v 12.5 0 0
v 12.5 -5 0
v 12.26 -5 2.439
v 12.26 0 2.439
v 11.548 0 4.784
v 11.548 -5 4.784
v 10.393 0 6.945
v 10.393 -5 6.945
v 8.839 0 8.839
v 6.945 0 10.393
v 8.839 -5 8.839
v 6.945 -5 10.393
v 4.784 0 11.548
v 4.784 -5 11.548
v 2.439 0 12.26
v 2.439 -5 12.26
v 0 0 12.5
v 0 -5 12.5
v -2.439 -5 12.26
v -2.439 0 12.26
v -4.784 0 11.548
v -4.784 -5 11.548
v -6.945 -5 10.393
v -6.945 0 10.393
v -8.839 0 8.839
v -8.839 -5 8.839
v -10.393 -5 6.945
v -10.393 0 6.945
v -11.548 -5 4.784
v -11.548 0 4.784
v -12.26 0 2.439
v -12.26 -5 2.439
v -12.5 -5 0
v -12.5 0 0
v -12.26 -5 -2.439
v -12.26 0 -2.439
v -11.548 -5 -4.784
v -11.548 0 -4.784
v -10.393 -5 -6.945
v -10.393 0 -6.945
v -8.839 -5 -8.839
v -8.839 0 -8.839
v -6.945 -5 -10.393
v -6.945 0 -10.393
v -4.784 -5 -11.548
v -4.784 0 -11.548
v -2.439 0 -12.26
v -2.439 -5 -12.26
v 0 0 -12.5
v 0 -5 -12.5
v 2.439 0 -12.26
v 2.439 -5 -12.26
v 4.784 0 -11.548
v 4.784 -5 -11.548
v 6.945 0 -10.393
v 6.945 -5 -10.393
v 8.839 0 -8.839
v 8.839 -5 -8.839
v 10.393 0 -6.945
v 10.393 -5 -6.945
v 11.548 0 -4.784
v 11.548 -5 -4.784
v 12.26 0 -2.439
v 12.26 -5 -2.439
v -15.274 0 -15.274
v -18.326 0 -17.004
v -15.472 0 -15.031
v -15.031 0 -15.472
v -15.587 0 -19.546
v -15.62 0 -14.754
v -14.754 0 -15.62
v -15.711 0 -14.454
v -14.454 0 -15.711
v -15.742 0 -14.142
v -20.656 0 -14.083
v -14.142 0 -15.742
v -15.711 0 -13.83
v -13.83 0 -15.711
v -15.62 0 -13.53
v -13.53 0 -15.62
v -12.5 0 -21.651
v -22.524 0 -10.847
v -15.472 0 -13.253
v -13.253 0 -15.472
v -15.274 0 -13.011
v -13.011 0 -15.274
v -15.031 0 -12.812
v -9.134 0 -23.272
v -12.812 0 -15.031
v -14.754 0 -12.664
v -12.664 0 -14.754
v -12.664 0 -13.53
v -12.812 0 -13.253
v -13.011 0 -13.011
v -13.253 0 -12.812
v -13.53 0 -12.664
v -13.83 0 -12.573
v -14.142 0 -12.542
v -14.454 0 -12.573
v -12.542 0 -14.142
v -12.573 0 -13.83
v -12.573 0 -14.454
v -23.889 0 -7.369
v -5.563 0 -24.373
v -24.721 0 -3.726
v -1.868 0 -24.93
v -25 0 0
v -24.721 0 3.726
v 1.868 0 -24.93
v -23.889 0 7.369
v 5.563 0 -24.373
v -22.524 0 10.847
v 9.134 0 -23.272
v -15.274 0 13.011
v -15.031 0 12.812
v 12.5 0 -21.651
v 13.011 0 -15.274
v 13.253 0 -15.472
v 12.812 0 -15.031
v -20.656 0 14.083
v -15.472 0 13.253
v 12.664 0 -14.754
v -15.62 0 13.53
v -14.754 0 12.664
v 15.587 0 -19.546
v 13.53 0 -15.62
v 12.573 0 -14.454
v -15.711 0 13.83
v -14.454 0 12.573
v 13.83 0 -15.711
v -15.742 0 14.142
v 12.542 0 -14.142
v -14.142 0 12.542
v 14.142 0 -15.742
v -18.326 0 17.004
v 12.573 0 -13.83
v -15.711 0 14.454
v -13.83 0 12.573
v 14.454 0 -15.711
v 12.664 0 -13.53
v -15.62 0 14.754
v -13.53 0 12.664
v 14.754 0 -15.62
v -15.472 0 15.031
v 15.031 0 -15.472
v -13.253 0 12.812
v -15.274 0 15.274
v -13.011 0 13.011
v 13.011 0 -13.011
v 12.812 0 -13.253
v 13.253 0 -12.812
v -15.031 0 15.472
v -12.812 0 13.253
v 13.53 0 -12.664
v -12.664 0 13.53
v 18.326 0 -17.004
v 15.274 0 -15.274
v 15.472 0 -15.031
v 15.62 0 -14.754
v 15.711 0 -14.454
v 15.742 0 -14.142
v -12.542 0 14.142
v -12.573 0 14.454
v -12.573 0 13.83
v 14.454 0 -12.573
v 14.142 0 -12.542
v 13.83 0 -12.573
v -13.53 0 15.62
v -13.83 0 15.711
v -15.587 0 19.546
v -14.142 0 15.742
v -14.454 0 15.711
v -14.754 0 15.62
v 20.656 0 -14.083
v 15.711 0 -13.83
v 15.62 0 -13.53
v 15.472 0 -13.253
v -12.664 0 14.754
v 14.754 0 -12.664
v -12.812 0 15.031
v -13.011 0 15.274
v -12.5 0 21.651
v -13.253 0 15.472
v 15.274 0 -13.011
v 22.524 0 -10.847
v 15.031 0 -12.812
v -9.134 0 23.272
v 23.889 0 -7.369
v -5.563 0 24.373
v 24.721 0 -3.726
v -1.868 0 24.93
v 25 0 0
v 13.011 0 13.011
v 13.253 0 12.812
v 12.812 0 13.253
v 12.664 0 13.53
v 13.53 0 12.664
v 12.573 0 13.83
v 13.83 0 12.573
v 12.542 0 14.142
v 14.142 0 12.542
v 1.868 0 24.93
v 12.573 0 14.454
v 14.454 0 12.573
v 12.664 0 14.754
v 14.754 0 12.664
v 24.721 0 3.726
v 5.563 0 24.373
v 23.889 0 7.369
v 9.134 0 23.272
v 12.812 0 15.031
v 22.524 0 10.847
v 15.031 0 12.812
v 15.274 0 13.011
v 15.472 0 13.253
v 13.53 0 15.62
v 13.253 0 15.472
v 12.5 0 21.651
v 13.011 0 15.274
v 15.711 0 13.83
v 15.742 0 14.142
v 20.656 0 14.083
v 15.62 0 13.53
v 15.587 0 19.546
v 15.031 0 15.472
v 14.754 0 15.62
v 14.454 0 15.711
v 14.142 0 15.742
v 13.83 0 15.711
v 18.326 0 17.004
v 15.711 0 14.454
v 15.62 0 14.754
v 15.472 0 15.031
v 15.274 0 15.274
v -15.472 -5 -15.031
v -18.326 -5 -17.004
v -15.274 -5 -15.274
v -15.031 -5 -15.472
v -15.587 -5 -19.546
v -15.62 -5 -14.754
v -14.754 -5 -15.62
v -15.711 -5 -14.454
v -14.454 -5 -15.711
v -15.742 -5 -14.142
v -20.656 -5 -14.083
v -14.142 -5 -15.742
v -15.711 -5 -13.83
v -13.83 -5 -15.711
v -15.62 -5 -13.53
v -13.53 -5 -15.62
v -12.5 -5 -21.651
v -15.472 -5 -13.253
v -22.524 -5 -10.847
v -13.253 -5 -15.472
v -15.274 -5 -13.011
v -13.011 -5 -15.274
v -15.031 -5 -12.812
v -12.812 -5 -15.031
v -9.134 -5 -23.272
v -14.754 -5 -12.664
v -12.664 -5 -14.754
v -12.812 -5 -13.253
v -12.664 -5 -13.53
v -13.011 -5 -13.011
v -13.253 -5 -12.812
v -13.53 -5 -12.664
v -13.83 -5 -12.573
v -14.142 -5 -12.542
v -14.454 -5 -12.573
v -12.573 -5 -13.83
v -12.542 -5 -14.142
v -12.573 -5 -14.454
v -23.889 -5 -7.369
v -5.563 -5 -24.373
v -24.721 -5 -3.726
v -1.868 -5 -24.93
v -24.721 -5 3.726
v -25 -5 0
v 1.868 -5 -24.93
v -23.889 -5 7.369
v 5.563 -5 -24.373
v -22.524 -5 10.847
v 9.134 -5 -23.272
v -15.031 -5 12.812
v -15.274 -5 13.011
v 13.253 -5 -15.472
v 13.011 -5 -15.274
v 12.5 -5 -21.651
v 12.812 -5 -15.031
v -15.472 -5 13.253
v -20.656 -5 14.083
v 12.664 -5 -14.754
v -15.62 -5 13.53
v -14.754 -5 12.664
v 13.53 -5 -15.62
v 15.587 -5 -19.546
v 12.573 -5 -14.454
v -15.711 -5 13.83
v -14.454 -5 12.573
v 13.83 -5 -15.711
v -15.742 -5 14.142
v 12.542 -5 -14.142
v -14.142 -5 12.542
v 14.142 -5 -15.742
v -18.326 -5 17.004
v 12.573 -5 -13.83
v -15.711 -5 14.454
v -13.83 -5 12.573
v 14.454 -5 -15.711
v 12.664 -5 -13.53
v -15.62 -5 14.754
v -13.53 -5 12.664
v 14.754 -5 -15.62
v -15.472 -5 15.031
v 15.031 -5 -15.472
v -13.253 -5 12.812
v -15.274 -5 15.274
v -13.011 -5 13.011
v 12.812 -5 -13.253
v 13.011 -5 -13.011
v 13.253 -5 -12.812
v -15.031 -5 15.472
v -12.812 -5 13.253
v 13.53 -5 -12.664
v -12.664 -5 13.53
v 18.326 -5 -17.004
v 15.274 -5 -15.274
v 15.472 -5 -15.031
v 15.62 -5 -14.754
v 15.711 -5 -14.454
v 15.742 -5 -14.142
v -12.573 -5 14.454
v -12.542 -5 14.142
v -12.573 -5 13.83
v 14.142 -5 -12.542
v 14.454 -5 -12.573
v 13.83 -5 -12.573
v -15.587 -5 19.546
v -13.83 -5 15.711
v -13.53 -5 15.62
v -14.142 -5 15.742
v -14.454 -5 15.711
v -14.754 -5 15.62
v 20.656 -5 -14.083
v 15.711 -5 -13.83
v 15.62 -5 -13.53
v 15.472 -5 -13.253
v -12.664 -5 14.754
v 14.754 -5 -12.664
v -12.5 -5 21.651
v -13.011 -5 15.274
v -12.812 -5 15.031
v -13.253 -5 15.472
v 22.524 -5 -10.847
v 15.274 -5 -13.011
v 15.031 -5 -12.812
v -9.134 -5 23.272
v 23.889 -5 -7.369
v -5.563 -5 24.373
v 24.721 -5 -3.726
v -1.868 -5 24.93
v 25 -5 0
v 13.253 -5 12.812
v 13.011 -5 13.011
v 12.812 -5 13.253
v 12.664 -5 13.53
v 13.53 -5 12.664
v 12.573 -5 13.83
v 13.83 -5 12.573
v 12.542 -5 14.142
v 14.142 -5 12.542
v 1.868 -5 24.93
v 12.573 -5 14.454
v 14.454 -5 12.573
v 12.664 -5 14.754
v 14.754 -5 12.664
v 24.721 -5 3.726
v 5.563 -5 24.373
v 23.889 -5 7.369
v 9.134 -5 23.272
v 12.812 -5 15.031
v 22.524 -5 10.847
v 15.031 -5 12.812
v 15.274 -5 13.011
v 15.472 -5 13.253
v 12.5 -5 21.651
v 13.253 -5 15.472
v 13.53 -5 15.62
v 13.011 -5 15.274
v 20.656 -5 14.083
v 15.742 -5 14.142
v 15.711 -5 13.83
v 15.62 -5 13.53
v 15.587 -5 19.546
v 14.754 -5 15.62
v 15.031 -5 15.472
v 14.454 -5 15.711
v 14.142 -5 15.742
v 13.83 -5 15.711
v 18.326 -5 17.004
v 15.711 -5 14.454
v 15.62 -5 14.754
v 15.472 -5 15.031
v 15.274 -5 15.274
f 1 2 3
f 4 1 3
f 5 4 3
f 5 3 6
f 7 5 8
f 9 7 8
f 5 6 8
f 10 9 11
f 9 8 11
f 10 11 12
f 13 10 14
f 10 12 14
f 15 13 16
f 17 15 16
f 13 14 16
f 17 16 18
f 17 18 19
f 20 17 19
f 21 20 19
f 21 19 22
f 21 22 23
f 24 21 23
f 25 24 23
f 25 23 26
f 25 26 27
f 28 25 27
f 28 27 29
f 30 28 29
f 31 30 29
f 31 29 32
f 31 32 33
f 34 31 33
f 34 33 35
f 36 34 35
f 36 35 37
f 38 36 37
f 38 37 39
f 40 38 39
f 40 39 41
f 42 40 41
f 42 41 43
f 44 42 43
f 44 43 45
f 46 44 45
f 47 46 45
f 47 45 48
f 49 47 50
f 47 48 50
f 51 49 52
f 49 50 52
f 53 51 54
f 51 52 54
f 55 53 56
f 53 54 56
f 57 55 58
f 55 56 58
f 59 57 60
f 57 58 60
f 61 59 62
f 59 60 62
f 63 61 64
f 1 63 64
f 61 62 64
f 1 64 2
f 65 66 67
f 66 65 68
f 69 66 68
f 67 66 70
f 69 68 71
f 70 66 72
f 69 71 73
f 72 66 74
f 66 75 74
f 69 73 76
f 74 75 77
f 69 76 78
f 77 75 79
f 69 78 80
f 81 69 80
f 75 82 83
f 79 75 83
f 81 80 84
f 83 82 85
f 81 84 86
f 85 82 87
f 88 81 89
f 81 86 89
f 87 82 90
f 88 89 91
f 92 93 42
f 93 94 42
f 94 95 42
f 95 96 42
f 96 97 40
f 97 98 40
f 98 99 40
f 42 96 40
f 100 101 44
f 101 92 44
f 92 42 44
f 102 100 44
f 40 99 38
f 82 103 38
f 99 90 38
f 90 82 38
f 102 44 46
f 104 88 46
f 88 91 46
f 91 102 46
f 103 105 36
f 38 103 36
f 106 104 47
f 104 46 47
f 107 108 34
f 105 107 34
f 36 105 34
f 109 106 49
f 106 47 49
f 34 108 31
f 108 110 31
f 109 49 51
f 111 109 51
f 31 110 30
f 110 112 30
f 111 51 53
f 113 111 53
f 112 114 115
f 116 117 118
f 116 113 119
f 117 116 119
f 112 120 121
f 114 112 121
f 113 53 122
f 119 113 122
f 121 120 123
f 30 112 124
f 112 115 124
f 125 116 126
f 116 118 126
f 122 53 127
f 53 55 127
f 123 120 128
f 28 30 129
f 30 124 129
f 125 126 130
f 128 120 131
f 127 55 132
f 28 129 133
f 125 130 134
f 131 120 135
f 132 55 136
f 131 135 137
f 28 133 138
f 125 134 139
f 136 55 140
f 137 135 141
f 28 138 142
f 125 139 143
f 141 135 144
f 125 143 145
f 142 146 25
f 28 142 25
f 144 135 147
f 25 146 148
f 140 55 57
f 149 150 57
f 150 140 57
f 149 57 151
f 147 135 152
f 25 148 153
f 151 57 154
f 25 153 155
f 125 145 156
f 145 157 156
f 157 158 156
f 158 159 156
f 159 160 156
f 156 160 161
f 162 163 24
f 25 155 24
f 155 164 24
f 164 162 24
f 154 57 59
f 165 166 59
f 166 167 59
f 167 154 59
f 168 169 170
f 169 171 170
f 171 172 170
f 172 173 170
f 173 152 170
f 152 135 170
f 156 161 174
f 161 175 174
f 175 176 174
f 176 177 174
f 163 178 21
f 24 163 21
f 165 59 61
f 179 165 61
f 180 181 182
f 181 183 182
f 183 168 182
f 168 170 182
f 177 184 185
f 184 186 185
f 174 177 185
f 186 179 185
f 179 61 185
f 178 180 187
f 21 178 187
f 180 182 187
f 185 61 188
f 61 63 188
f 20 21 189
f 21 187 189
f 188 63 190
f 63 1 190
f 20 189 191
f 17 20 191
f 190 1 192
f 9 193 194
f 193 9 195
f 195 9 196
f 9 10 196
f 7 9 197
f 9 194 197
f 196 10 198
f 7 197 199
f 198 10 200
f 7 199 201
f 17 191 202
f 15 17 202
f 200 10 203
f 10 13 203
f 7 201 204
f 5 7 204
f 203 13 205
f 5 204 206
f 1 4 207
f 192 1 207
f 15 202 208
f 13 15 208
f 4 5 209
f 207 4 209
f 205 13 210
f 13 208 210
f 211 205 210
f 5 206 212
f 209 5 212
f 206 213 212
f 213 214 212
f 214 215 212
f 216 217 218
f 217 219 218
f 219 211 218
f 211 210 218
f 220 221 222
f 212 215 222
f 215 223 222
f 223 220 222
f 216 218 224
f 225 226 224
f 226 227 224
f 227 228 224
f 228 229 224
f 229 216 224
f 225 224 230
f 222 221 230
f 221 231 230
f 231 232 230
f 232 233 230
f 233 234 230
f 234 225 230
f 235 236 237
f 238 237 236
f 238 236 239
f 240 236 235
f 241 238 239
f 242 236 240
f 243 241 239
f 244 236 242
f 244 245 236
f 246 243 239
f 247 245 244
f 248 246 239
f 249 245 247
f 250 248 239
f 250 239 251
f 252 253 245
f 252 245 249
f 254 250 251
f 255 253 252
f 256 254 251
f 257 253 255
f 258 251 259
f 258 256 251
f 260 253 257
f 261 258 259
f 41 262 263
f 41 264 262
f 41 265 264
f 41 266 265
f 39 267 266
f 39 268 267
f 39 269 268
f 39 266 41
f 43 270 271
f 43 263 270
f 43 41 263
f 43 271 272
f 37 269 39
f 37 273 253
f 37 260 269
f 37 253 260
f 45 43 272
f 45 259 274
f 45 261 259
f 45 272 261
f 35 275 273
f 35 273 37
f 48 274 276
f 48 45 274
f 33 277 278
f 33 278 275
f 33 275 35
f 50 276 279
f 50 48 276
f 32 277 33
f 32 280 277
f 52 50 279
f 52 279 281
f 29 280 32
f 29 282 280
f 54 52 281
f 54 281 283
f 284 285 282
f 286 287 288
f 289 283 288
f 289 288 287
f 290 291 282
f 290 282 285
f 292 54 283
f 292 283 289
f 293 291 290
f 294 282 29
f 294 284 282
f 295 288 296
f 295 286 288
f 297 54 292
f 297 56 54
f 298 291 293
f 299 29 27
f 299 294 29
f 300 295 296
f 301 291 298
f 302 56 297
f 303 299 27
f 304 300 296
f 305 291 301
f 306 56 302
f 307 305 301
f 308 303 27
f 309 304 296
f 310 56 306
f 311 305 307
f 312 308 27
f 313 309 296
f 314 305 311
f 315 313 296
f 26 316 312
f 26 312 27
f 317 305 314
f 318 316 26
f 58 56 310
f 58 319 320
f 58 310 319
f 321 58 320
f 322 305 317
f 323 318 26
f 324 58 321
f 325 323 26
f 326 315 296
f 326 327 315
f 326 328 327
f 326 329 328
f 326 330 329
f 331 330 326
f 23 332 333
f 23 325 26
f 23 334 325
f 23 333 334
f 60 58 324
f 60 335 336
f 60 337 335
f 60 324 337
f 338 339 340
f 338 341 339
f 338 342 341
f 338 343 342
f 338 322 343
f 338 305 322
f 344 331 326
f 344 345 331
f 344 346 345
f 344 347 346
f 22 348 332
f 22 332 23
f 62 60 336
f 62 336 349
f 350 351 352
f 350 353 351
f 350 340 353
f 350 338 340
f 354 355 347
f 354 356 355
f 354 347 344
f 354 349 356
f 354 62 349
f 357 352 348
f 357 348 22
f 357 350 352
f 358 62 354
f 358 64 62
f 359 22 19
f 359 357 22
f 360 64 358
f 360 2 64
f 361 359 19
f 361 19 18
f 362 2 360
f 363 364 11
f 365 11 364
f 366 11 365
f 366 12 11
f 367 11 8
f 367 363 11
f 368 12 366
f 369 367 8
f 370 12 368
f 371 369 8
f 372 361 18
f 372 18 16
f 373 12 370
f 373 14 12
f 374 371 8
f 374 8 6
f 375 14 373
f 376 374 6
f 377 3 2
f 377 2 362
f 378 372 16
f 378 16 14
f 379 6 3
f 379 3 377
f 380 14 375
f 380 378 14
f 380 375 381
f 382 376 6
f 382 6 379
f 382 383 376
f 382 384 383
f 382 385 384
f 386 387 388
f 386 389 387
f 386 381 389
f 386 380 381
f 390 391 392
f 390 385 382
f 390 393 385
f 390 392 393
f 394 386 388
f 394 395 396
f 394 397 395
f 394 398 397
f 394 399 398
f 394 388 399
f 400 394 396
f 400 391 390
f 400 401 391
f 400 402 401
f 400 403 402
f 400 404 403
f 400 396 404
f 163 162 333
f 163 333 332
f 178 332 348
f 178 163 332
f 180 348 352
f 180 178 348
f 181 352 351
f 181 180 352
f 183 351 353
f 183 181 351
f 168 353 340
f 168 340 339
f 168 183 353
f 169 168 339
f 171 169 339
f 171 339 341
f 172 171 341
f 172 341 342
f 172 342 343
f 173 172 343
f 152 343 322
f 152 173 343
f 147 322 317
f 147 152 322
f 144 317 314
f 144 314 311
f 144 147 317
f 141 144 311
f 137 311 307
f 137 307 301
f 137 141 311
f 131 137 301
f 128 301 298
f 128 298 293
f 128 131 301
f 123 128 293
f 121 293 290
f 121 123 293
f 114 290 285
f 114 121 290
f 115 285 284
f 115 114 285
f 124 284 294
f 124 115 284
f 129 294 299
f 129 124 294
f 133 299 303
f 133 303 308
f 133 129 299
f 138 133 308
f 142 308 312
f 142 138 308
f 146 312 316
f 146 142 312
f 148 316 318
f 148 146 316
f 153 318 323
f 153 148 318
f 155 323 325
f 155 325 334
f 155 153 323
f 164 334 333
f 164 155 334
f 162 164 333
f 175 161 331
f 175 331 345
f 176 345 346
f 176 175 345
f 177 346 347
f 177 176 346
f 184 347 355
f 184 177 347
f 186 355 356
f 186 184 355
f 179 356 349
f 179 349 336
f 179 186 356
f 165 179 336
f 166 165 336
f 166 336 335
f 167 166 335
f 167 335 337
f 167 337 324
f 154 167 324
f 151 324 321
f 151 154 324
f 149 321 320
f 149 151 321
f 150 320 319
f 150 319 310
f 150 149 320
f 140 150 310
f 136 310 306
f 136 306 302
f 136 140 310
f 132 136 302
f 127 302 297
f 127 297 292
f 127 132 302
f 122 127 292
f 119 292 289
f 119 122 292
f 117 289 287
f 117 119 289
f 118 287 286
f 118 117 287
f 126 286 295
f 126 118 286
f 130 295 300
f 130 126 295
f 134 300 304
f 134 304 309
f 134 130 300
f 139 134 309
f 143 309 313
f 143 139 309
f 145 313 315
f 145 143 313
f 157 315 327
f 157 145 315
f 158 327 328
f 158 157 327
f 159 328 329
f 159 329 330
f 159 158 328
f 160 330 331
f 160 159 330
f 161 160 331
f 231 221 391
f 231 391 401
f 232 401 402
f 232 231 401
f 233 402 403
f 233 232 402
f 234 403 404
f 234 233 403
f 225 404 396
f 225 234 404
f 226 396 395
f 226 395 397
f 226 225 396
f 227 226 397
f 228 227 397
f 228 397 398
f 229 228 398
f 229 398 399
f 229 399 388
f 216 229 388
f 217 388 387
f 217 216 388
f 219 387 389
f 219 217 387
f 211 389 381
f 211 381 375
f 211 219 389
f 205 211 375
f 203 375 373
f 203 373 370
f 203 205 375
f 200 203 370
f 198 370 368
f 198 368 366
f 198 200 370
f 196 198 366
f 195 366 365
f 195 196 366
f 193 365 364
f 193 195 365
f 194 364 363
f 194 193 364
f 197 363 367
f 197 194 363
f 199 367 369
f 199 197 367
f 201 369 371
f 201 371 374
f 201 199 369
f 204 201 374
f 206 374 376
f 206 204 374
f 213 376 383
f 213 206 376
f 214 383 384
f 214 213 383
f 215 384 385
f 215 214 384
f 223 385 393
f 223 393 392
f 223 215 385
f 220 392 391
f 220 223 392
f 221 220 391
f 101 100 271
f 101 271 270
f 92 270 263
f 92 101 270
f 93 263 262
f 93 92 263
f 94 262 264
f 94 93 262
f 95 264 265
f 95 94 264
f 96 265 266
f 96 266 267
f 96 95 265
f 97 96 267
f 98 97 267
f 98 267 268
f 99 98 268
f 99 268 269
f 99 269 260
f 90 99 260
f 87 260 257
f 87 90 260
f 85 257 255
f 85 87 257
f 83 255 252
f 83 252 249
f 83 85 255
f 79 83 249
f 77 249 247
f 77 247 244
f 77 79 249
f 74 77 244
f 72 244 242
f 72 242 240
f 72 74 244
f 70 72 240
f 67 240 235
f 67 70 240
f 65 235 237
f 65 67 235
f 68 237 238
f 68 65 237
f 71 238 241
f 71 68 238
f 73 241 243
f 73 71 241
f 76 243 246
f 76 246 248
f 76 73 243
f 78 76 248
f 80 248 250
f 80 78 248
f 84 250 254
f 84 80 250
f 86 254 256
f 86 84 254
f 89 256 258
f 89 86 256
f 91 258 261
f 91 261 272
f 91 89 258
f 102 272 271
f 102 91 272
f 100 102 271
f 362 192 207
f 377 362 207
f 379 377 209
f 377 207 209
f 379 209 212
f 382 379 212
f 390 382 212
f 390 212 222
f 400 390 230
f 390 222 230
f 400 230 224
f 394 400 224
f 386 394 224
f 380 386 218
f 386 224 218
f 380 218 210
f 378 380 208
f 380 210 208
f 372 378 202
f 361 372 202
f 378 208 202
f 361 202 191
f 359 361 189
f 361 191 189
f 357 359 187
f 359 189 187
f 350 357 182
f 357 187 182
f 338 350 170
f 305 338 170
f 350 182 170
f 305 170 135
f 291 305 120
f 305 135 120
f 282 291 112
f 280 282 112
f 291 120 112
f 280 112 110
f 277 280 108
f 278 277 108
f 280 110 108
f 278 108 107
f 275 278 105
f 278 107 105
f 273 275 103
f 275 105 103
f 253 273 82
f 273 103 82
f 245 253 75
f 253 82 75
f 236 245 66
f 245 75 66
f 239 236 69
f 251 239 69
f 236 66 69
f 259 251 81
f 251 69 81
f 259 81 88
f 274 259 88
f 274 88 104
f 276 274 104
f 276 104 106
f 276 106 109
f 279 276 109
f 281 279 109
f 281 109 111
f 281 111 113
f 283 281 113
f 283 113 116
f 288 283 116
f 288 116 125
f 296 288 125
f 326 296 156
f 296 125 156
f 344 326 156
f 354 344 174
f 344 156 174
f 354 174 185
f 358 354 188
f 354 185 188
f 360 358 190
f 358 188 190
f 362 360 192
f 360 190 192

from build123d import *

# Parameters (mm, degrees)
F0_R     = 25
F0_R_2   = 1.6
F1_DEPTH = 5
F2_R     = 12.5
F3_DEPTH = 51.2


with BuildPart() as f1:
    # F0 (on Front) → F1 (new body)
    with BuildSketch(Plane.XZ):
        Circle(F0_R)
        with Locations((-14.142136, -14.142136)):
            Circle(F0_R_2, mode=Mode.SUBTRACT)
        with Locations((14.142136, -14.142136)):
            Circle(F0_R_2, mode=Mode.SUBTRACT)
        with Locations((-14.142136, 14.142136)):
            Circle(F0_R_2, mode=Mode.SUBTRACT)
        with Locations((14.142136, 14.142136)):
            Circle(F0_R_2, mode=Mode.SUBTRACT)
    extrude(amount=F1_DEPTH)

    # F2 (on face) → F3 (cut)
    with BuildSketch(Plane.XZ.offset(5)):
        Circle(F2_R)
    extrude(amount=-F3_DEPTH, mode=Mode.SUBTRACT)


solid = f1.part
